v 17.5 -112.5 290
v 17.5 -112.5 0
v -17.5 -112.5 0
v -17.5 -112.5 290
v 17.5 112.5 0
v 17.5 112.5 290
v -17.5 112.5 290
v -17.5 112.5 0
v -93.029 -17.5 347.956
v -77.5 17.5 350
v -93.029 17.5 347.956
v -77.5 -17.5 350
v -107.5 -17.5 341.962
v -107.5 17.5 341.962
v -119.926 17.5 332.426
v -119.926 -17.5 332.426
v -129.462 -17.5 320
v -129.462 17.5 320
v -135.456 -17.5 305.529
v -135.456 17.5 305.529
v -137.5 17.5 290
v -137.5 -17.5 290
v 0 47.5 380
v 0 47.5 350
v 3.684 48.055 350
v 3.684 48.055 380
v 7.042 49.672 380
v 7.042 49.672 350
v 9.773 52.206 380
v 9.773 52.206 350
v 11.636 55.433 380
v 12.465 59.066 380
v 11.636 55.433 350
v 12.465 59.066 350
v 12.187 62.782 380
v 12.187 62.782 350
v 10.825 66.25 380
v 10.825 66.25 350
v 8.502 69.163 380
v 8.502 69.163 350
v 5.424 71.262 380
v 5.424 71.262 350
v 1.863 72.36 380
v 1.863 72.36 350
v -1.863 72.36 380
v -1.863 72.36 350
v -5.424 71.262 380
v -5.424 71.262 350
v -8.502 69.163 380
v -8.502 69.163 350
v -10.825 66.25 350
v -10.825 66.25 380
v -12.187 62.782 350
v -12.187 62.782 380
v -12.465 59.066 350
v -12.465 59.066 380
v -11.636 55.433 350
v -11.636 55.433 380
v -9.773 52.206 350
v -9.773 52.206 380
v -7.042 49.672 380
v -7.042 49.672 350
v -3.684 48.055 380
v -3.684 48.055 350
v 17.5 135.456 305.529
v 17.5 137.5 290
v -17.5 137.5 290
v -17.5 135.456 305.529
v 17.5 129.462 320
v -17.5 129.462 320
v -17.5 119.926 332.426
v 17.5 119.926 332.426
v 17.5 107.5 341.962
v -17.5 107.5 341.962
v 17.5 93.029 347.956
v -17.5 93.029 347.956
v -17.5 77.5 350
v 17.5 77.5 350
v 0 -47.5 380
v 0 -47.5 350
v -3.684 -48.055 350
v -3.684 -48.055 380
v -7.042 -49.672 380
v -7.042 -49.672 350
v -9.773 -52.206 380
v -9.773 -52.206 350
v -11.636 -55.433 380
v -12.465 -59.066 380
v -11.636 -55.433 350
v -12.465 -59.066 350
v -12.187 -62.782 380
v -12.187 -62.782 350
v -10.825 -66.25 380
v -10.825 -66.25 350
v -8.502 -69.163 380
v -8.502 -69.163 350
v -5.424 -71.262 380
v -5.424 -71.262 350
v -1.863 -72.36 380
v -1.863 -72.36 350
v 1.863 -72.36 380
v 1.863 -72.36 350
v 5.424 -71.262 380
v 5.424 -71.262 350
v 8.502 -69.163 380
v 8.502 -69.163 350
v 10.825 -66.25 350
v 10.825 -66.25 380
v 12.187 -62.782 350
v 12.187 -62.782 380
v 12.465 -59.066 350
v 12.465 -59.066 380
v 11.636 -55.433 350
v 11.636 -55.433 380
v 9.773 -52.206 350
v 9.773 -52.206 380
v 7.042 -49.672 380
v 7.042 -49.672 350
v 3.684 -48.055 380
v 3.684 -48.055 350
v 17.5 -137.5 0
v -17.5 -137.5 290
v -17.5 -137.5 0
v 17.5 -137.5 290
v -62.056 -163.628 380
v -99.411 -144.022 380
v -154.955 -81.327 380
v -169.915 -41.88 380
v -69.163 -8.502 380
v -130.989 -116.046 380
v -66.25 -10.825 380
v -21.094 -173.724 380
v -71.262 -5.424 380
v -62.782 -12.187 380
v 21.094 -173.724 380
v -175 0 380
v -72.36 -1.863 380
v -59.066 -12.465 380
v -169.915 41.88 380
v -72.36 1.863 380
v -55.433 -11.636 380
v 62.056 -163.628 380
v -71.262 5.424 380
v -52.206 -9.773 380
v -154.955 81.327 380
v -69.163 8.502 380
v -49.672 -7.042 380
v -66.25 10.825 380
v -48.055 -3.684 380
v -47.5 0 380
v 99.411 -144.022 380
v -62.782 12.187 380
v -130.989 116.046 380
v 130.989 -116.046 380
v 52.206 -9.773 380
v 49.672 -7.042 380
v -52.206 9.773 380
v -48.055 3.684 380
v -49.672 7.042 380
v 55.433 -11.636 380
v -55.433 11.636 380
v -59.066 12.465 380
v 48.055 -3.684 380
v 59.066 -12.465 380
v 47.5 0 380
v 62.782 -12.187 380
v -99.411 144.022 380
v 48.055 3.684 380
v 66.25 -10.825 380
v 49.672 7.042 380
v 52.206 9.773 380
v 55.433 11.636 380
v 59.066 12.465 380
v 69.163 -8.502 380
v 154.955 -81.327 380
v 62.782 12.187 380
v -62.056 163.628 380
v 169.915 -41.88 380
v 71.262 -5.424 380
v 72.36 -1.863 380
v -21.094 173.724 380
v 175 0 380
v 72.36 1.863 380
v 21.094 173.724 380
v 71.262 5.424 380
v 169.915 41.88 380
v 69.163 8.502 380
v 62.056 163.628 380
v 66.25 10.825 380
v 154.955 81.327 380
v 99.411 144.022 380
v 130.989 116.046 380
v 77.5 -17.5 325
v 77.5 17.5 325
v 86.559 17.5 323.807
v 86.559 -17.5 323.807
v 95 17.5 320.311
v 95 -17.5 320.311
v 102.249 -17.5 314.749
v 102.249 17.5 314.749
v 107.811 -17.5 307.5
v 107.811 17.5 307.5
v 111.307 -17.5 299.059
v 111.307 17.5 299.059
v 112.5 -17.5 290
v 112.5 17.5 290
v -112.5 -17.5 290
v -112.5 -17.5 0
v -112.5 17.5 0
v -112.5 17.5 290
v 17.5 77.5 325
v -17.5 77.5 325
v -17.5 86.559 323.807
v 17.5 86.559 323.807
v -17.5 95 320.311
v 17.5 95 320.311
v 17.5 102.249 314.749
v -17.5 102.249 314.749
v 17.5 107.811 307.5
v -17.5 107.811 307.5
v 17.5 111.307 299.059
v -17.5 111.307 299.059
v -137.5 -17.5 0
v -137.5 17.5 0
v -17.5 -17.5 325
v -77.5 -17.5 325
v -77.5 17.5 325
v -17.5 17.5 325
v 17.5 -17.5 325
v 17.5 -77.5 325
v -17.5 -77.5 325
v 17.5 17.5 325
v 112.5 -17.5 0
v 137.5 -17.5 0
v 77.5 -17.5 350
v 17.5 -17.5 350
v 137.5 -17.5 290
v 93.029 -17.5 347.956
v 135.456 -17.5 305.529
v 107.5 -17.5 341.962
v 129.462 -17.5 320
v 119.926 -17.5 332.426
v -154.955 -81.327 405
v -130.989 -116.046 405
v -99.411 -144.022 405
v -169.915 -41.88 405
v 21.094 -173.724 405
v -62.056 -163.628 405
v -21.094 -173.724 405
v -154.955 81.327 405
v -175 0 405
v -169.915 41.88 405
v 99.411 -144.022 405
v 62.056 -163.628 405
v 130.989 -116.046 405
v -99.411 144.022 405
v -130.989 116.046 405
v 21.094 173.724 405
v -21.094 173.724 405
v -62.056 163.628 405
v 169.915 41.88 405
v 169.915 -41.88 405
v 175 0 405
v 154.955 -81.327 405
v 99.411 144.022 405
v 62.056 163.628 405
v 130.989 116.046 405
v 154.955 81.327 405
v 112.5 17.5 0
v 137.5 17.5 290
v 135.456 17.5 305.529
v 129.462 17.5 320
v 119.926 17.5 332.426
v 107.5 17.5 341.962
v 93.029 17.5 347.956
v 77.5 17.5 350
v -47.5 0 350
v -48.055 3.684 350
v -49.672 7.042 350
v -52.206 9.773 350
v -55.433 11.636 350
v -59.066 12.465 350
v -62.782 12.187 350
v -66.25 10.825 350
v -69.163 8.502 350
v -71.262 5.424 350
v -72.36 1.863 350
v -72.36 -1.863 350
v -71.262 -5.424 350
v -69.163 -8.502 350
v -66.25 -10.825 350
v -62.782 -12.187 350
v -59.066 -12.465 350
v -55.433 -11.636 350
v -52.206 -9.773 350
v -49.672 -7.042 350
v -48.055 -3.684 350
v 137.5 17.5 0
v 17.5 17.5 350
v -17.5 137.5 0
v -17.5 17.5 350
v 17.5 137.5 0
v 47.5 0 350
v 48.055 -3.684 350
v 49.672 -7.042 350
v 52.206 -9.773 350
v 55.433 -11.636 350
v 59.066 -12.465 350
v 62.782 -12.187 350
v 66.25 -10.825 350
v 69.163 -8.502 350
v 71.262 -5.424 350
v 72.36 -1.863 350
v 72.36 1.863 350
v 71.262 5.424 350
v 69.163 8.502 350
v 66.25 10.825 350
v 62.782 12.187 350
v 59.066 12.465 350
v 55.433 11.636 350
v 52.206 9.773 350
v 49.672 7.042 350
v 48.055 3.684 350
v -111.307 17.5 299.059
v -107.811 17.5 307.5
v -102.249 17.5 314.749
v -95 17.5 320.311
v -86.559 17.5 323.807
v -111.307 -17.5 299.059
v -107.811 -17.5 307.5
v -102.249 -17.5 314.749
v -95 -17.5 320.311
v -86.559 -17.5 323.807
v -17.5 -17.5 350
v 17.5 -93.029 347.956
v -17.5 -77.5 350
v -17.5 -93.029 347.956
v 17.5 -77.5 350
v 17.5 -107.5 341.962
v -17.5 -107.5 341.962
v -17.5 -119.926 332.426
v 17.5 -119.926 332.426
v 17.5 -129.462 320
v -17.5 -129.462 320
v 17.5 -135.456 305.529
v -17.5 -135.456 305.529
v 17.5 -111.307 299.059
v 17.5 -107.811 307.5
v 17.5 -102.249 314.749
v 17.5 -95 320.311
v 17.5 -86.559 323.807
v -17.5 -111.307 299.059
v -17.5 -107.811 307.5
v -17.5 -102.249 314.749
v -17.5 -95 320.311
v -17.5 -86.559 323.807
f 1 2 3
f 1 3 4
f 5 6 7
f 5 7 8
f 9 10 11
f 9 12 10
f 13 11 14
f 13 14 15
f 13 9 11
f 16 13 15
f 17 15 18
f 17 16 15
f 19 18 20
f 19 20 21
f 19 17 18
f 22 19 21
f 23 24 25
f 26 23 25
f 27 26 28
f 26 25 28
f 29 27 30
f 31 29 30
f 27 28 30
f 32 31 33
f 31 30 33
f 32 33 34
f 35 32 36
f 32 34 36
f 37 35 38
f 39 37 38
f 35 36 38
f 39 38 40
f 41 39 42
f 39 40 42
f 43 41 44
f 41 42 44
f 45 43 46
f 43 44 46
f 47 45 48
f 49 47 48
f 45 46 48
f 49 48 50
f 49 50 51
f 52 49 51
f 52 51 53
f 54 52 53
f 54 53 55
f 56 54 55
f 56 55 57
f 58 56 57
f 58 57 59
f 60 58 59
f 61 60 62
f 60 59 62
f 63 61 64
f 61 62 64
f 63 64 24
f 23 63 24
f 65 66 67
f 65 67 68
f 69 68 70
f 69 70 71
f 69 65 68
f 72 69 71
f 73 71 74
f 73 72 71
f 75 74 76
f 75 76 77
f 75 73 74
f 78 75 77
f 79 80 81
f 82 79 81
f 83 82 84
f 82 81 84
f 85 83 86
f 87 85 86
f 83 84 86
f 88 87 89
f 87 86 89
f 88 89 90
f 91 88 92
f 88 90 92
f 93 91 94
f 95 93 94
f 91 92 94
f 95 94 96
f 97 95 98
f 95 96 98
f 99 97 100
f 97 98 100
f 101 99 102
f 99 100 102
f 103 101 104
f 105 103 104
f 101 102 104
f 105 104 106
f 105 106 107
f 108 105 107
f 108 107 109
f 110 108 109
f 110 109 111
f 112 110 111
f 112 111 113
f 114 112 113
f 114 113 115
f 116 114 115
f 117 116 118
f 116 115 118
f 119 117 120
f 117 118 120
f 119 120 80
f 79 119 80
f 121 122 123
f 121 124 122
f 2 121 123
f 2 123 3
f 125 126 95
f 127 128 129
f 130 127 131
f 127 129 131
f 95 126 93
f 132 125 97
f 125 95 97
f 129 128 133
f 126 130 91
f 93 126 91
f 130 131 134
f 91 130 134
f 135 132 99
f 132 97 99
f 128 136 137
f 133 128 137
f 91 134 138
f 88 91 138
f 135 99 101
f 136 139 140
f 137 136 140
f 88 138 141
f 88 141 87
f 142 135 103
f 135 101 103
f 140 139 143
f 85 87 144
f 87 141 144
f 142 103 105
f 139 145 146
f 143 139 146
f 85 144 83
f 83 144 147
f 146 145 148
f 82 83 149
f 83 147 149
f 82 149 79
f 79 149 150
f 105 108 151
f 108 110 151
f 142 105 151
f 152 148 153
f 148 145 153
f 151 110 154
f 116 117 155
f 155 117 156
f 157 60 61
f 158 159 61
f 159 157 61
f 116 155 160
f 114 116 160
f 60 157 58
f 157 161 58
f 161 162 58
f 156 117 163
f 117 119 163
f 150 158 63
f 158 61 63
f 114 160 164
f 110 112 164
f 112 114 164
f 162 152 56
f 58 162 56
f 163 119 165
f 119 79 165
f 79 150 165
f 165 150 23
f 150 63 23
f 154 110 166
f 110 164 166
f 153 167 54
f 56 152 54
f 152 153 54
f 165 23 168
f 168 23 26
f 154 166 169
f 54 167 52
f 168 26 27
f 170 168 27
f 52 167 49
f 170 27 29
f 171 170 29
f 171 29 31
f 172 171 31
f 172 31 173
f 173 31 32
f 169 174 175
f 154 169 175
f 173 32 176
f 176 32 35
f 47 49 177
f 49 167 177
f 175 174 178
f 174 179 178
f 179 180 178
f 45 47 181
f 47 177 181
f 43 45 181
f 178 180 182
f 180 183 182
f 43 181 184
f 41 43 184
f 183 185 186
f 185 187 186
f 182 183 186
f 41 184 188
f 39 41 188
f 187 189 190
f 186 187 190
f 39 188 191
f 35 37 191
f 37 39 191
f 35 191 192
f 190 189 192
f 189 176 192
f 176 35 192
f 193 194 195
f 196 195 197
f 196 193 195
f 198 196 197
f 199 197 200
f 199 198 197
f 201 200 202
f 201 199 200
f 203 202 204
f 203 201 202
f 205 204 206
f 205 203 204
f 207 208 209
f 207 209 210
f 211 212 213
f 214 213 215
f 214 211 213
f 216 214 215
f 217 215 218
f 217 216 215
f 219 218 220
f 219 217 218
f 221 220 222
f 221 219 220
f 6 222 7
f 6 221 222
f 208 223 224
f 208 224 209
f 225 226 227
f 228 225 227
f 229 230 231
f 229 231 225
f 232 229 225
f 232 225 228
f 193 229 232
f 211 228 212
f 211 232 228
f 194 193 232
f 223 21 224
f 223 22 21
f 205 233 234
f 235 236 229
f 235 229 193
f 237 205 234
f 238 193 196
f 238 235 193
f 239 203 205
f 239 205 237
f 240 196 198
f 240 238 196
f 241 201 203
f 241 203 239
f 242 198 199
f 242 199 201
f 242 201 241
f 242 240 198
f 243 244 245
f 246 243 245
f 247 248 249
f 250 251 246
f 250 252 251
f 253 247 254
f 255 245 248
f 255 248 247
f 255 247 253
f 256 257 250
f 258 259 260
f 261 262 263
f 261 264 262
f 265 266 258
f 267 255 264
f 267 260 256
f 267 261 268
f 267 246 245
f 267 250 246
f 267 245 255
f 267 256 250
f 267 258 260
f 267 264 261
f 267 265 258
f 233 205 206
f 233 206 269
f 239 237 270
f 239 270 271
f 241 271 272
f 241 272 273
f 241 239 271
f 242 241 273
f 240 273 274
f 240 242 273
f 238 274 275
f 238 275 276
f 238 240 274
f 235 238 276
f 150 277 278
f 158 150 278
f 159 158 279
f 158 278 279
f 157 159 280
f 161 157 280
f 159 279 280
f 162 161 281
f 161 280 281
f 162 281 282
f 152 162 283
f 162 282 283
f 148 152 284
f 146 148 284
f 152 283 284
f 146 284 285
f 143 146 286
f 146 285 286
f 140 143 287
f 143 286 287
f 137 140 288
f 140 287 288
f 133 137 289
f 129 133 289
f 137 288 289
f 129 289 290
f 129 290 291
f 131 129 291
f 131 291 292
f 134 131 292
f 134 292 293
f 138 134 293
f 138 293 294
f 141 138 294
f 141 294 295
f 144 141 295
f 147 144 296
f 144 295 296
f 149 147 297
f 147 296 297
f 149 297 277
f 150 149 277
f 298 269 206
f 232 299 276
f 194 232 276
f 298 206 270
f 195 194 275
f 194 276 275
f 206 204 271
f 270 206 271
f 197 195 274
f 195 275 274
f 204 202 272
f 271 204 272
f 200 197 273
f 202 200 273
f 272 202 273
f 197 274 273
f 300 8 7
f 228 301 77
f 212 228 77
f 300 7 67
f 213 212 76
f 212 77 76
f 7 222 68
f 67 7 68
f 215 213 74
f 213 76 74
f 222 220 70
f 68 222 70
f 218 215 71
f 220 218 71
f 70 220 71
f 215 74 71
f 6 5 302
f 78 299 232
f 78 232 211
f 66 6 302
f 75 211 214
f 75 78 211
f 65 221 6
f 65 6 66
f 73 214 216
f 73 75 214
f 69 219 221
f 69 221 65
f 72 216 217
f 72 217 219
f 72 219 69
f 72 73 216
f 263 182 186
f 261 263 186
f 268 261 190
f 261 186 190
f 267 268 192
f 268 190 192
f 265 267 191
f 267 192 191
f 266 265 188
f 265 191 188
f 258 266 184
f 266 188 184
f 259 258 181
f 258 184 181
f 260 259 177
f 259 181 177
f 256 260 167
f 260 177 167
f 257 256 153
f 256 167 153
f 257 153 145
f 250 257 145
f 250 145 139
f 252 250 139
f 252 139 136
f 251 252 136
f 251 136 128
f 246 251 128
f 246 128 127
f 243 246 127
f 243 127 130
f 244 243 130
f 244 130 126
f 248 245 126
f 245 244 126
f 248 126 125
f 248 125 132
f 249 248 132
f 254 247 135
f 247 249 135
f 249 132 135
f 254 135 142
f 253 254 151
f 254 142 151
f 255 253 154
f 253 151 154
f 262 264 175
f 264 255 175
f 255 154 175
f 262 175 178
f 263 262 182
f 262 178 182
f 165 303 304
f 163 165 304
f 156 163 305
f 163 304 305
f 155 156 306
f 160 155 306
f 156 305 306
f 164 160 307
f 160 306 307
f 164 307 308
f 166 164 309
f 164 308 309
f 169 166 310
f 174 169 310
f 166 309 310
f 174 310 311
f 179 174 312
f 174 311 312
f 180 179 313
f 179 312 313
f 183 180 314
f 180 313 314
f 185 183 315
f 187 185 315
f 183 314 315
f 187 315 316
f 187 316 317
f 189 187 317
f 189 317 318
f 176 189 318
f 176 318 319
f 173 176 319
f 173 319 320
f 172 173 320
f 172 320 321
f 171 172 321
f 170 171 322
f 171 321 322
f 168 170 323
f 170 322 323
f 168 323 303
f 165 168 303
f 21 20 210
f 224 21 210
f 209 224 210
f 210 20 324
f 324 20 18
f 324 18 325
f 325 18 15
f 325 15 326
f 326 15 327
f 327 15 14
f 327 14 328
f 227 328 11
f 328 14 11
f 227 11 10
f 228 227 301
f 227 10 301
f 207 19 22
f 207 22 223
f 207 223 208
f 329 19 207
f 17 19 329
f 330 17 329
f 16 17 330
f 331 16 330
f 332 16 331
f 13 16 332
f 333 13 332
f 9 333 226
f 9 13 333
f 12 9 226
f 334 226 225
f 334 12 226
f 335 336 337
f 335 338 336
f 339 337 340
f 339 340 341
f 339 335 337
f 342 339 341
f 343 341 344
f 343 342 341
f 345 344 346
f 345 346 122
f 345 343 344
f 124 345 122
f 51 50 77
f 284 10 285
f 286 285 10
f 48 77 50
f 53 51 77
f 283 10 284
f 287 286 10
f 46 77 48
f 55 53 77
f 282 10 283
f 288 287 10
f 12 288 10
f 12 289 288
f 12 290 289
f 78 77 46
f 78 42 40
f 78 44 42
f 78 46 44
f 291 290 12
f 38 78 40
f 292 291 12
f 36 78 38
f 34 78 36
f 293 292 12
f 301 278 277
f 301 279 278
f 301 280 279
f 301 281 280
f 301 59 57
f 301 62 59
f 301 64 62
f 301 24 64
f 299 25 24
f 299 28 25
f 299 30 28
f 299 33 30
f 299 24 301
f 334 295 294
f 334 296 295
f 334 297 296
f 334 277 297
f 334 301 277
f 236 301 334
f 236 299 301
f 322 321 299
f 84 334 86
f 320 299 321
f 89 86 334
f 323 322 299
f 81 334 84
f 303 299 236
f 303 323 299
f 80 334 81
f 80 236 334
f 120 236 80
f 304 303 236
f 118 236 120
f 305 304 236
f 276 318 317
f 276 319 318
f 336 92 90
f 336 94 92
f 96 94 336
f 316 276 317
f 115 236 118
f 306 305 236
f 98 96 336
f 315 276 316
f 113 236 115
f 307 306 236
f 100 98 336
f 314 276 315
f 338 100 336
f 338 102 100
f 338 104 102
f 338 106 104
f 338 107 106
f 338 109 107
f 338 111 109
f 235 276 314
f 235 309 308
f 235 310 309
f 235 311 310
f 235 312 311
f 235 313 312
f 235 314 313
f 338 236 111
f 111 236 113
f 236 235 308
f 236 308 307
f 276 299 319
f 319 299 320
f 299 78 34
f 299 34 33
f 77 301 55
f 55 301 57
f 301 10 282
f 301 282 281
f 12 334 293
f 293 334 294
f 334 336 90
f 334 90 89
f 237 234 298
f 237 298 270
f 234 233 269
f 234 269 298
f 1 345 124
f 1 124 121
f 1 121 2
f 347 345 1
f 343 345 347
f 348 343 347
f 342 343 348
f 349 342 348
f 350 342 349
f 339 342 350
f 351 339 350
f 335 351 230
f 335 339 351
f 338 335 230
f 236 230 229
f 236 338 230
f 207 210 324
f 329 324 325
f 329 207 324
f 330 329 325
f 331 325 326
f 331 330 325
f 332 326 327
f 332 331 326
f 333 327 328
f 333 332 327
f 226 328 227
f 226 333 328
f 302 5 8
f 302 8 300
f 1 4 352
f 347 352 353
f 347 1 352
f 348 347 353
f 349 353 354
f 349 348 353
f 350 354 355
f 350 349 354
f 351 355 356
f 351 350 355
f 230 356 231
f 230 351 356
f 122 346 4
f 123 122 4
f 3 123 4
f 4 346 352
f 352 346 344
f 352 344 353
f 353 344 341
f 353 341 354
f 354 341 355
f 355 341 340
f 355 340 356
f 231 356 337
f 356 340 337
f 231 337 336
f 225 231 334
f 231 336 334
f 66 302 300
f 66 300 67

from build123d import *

# Parameters (mm, degrees)
F1_DEPTH = 17.5
F2_COUNT = 2
F2_ANGLE = 90
F4_R     = 175
F5_DEPTH = 25
F6_R     = 12.5
F7_DEPTH = 30
F8_COUNT = 4


with BuildPart() as f1:
    # F0 (on Front) → F1 (new body, symmetric)
    with BuildSketch(Plane.XZ):
        with BuildLine():
            Line((-137.5, 290), (-137.5, 0))
            Line((-137.5, 0), (-112.5, 0))
            Line((-112.5, 0), (-112.5, 290))
            ThreePointArc((-112.5, 290), (-102.248737, 314.748737), (-77.5, 325))
            Line((-77.5, 325), (0, 325))
            Line((0, 325), (77.5, 325))
            ThreePointArc((77.5, 325), (102.248737, 314.748737), (112.5, 290))
            Line((112.5, 290), (112.5, 0))
            Line((112.5, 0), (137.5, 0))
            Line((137.5, 0), (137.5, 290))
            ThreePointArc((137.5, 290), (119.926407, 332.426407), (77.5, 350))
            Line((77.5, 350), (0, 350))
            Line((0, 350), (-77.5, 350))
            ThreePointArc((-77.5, 350), (-119.926407, 332.426407), (-137.5, 290))
        make_face()
    extrude(amount=F1_DEPTH, both=True)

    # F2: F1 ×2 about axis
    f2_axis = Axis((0, 0, 337.5), (0, 0, 1))


with BuildPart() as f1_1:
    add(f1.part)
    for i in range(1, F2_COUNT):
        add(f1.part.rotate(f2_axis, i * F2_ANGLE / (F2_COUNT - 1)))



with BuildPart() as f5:
    # F4 (on offset) → F5 (new body)
    with BuildSketch(Plane.XY.offset(380)):
        Circle(F4_R)
    extrude(amount=F5_DEPTH)


with BuildPart() as f1_2:
    add(f1_1.part)

    add(f5.part)  # F7 merges F5
    # F6 (on face) → F7 (join, through all)
    with BuildSketch(Plane.XY.offset(350)):
        with Locations((-60, 0)):
            Circle(F6_R)
    extrude(amount=F7_DEPTH)

    # F8: F1 ×4 about axis
    f8_axis = Axis((0, 0, 337.5), (0, 0, 1))


with BuildPart() as f1_3:
    add(f1_2.part)
    for i in range(1, F8_COUNT):
        add(f1_2.part.rotate(f8_axis, i * 360 / F8_COUNT))


solid = f1_3.part
